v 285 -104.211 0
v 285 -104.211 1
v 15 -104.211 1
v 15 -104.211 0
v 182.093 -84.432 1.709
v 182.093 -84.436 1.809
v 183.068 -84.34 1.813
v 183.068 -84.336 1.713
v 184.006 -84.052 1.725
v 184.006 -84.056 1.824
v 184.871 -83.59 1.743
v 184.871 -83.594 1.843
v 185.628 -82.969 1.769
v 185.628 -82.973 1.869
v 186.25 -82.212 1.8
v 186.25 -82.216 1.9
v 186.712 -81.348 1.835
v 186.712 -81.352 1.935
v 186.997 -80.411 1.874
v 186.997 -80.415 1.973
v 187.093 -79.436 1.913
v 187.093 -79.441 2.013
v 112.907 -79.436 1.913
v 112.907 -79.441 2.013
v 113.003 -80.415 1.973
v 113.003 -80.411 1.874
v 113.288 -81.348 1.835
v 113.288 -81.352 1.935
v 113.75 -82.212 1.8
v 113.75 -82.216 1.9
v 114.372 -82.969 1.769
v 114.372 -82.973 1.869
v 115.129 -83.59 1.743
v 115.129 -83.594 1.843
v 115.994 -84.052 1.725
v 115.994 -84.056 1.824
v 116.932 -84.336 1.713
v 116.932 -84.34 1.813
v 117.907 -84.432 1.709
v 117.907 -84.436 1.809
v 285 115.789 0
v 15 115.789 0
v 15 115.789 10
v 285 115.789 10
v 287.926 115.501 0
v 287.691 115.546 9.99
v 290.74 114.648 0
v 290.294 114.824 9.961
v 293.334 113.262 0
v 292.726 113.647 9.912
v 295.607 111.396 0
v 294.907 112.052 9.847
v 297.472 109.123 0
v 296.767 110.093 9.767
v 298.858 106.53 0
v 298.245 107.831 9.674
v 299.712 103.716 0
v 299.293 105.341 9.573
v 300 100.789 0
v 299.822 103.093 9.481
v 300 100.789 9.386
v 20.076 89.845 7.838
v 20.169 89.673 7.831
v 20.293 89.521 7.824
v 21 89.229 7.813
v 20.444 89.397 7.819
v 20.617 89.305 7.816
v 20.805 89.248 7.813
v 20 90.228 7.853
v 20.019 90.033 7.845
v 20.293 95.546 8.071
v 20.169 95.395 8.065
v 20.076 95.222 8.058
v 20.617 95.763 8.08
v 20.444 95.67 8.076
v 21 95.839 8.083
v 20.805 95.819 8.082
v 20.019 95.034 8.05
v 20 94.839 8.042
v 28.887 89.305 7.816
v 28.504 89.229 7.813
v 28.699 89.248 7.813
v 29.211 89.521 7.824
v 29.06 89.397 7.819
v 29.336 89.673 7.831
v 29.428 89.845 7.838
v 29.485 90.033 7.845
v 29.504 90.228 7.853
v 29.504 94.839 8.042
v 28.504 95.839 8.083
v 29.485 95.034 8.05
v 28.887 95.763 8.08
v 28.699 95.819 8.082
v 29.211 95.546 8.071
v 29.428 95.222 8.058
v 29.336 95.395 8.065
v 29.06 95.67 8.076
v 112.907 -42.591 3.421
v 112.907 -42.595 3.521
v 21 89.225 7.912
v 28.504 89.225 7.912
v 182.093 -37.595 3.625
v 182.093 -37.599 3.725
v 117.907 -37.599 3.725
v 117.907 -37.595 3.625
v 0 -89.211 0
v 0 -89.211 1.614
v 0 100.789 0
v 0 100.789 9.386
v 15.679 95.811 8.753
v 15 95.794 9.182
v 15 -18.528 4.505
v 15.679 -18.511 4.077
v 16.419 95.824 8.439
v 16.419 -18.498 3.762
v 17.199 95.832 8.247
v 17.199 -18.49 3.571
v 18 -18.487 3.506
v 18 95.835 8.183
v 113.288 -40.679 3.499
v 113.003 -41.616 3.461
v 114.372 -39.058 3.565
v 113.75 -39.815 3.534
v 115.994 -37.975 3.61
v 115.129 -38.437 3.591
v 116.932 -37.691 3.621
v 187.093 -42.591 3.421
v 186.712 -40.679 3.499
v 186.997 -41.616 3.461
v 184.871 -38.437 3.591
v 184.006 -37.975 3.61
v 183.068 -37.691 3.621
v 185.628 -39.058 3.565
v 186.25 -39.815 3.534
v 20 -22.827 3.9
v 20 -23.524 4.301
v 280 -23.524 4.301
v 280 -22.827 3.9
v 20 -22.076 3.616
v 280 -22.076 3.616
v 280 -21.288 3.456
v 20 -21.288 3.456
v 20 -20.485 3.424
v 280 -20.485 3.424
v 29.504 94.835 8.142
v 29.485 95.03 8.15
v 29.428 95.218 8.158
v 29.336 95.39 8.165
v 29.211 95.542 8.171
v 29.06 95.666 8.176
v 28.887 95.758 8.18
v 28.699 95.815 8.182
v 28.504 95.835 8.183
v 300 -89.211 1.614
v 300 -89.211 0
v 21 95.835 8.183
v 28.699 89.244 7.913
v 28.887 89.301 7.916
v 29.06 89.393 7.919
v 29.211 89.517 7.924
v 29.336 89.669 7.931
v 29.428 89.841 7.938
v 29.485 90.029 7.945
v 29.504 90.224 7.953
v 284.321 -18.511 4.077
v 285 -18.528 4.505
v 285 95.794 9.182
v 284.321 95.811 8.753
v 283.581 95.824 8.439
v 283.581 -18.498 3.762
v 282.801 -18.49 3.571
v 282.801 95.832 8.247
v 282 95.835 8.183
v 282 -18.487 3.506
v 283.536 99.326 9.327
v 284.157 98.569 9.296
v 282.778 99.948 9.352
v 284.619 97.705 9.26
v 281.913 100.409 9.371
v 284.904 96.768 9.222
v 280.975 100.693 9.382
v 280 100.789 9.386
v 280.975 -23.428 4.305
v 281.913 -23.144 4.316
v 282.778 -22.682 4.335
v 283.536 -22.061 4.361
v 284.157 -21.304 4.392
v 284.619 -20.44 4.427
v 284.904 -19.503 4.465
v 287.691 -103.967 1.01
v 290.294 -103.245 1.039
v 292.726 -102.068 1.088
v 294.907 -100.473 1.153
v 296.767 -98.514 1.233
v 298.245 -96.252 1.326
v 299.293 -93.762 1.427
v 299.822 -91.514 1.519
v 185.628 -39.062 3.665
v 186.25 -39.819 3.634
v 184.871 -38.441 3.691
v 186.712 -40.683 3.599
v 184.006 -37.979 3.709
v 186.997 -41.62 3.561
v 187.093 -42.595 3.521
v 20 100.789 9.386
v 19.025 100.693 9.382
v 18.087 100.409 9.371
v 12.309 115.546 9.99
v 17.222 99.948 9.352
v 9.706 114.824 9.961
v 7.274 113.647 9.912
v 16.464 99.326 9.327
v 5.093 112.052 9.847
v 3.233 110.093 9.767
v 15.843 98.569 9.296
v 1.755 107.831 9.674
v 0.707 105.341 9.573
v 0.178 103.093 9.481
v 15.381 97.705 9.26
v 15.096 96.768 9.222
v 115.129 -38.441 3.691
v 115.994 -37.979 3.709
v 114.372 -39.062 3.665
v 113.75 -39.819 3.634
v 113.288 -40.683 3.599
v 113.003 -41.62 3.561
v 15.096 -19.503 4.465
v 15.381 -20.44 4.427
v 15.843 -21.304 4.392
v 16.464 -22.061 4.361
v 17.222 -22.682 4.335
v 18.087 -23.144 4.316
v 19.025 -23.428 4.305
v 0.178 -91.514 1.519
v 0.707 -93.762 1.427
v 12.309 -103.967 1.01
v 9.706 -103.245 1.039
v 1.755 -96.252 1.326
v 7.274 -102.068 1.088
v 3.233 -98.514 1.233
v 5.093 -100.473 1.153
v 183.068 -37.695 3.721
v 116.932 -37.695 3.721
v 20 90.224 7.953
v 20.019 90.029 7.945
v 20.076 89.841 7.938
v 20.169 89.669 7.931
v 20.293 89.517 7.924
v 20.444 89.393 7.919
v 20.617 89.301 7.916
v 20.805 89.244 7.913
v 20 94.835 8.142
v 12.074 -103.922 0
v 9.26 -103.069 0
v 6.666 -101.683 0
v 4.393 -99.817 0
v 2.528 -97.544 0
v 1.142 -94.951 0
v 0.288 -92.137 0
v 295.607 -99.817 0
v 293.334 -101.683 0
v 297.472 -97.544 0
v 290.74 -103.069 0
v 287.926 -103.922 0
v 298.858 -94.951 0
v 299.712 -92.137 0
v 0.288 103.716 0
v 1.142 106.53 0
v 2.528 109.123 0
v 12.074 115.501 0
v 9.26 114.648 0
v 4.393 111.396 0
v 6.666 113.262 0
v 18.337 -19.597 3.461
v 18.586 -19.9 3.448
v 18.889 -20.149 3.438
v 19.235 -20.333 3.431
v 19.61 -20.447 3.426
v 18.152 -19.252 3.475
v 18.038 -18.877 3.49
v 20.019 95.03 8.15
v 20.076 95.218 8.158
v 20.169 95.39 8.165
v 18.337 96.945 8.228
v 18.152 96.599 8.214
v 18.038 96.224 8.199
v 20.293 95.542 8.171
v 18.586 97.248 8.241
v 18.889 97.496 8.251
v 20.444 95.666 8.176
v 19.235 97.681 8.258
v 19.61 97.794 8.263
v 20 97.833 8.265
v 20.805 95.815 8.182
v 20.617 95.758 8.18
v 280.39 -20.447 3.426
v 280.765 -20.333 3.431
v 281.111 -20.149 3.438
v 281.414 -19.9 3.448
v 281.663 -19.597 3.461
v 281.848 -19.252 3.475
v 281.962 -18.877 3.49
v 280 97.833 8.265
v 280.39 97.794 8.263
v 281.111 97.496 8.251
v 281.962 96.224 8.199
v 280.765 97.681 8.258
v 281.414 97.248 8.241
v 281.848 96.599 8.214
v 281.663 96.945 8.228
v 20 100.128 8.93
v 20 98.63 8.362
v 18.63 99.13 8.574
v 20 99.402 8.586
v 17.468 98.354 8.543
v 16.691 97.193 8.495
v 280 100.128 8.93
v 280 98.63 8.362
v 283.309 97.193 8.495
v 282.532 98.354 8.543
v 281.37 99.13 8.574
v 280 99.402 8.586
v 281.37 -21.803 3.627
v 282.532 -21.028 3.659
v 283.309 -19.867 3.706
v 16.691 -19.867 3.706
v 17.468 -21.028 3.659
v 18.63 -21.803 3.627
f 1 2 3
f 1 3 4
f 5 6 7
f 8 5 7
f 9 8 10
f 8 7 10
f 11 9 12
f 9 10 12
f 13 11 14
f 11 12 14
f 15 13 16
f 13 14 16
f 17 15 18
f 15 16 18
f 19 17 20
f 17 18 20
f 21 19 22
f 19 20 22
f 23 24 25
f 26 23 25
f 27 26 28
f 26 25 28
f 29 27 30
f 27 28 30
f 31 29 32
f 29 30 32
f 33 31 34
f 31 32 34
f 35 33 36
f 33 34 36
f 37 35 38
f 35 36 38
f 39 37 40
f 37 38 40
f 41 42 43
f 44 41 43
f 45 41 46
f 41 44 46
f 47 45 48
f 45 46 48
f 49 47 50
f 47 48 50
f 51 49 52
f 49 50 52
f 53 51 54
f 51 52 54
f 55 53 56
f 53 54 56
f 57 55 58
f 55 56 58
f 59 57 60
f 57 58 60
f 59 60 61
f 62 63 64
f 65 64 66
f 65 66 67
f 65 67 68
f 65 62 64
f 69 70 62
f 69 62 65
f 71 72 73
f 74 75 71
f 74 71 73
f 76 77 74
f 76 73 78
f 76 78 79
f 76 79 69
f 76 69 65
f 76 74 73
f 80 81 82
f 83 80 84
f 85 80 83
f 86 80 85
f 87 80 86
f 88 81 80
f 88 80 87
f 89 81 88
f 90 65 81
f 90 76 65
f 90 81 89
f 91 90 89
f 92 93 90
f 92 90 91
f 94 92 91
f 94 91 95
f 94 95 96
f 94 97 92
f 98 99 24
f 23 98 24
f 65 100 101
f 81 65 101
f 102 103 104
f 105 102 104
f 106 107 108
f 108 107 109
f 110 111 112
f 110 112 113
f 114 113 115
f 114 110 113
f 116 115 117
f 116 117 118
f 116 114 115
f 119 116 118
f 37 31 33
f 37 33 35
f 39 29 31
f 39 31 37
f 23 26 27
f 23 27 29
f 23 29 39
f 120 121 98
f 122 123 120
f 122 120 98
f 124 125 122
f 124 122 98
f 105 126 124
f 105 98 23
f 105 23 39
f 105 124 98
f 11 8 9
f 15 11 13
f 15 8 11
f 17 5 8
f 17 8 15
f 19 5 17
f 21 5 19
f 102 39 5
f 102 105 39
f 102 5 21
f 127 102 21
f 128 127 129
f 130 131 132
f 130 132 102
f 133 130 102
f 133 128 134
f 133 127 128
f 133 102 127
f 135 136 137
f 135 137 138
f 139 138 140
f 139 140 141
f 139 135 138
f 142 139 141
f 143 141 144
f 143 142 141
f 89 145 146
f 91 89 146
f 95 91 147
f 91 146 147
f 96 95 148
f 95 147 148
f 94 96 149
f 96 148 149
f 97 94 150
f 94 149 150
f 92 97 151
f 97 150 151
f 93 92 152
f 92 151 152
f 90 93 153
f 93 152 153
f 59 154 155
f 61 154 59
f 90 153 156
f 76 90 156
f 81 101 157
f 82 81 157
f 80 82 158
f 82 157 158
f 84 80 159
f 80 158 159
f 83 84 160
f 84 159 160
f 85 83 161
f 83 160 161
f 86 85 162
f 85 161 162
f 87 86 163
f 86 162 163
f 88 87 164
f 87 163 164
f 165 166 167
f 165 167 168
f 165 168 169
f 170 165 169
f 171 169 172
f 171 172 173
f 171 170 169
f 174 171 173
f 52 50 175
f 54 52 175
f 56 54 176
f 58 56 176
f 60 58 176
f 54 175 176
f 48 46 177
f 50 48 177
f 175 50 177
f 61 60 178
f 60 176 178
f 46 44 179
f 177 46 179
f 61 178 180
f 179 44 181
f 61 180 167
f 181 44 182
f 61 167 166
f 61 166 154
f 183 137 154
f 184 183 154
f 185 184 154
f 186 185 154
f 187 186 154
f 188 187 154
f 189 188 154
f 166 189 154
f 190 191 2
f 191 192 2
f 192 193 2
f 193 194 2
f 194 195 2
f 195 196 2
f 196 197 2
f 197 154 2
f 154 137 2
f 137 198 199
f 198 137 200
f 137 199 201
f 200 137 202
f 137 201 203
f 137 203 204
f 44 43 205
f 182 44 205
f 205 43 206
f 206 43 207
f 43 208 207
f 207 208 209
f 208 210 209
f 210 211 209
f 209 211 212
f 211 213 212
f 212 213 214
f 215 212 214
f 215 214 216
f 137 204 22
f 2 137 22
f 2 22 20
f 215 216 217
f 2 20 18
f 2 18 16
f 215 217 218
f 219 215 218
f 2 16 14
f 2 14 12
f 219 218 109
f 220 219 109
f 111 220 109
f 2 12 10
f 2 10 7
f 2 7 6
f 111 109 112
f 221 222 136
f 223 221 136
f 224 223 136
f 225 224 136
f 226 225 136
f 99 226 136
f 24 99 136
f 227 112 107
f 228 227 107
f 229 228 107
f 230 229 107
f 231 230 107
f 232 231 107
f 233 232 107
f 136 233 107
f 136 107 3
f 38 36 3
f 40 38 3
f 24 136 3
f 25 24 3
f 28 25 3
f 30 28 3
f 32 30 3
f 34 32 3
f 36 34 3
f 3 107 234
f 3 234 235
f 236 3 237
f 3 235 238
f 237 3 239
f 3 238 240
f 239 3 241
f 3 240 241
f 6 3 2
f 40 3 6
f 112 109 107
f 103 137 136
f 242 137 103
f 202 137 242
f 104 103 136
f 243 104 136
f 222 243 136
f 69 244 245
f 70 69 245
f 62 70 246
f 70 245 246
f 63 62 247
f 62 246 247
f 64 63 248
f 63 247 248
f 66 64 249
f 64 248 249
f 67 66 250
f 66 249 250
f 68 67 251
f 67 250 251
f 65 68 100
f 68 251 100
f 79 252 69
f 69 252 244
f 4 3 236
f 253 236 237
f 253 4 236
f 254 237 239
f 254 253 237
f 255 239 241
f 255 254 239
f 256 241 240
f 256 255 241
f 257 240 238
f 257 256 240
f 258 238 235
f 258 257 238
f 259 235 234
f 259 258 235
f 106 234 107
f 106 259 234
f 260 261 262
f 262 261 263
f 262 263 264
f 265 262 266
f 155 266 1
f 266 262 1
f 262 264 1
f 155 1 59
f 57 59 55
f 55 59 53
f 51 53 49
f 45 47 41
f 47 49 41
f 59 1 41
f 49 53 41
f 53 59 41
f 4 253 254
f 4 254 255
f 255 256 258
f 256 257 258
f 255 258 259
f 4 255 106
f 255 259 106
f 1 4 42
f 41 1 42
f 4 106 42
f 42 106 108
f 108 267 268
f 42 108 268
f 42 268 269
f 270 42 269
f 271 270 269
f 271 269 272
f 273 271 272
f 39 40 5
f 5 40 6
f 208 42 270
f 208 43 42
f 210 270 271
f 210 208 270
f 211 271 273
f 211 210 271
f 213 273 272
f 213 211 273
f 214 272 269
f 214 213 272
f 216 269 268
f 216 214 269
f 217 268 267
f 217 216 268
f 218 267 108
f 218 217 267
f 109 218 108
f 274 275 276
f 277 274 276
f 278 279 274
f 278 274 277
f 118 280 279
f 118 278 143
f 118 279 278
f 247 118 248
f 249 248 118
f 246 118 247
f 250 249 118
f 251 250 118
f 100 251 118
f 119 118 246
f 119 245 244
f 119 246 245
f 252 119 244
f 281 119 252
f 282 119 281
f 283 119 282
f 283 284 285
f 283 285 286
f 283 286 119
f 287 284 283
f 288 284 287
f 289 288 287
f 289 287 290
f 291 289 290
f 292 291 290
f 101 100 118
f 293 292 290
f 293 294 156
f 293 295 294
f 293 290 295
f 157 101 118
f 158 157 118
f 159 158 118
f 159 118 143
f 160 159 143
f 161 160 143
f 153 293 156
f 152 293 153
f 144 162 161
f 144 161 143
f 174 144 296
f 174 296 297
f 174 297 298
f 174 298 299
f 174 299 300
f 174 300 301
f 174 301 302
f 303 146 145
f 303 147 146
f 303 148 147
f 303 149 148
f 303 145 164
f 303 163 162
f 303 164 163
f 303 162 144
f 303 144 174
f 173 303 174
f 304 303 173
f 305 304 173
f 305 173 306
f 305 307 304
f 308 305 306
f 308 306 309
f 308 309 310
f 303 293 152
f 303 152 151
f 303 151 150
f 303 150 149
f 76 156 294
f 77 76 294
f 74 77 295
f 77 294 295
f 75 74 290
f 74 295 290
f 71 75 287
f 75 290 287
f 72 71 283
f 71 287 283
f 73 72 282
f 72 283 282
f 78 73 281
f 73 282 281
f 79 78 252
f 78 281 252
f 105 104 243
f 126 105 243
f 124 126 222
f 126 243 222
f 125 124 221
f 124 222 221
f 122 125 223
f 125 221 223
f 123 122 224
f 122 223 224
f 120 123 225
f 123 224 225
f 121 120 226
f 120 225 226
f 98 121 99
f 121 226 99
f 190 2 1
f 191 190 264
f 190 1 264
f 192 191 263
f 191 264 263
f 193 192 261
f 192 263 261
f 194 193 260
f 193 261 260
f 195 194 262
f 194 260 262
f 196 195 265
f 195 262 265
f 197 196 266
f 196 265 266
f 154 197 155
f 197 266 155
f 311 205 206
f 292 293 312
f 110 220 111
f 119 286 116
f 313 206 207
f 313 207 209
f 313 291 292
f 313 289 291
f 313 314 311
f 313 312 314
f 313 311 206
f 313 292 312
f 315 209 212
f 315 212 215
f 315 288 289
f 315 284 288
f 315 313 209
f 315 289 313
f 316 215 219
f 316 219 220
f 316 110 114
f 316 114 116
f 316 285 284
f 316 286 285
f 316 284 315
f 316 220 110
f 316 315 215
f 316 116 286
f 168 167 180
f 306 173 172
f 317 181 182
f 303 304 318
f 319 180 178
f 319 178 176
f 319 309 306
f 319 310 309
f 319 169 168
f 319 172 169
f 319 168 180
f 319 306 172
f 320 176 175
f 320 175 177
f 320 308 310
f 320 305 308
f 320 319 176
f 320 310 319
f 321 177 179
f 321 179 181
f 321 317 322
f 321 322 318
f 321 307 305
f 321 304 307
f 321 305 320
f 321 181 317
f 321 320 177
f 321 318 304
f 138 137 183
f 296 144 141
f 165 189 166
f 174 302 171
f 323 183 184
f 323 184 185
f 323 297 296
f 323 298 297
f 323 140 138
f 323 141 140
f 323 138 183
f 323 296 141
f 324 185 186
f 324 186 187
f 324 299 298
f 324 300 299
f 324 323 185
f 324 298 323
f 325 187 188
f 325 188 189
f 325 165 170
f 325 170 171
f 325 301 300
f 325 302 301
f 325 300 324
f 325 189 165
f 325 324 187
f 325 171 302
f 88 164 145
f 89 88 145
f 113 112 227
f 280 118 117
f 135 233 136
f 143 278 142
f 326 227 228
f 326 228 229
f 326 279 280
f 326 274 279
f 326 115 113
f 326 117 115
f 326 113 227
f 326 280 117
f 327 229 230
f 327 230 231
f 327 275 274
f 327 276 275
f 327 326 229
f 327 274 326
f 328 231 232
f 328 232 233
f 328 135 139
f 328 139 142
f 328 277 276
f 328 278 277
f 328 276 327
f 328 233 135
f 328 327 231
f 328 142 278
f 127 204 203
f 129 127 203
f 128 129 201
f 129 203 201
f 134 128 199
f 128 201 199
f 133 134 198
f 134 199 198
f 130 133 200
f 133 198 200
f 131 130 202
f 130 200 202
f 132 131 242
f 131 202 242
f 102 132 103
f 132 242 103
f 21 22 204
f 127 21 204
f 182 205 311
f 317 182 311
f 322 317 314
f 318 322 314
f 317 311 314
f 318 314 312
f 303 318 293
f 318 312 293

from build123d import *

# Parameters (mm, degrees)
F1_DEPTH     = 300
F2_R         = 15
F4_DEPTH     = 1
F5_T1_DEPTH  = 260
F5_T3_DEPTH  = 114.4173096389
F5_T5_DEPTH  = 114.4173096389
F5_T8_ANGLE  = 90
F5_T10_ANGLE = 90
F5_T12_ANGLE = 90
F5_T14_ANGLE = 90
F7_DEPTH     = 0.1
F9_DEPTH     = 0.1


# Not quite as in the source:
# - a fillet or chamfer that OpenCascade refuses, or shapes differently, is made with other operations: its cross-section is extruded or revolved along the edge and cut away or added


with BuildPart() as f1:
    # F0 (on Right) → F1 (new body)
    with BuildSketch(Plane.YZ):
        Polygon((-104.210527479, 1), (-104.210527479, 0), (115.789472521, 0), (115.789472521, 10), align=None)
    extrude(amount=F1_DEPTH)

    # F2
    f2_edges = [f1.edges().sort_by_distance(p)[0] for p in [
        (300, 115.789473, 5),
        (0, 115.789473, 5),
        (0, -104.210527, 0.5),
        (300, -104.210527, 0.5),
    ]]
    fillet(f2_edges, radius=F2_R)

    # F3 (on face) → F4 (cut)
    with BuildSketch(Plane(origin=(0, -0.2149512742, 5.2543644811), x_dir=(1, 0, 0), z_dir=(0, -0.040874902, 0.999164272))):
        with BuildLine():
            Line((280, 101.0889066279), (20, 101.0889066279))
            ThreePointArc((20, 101.0889066279), (16.4644660941, 99.6244405339), (15, 96.0889066279))
            Line((15, 96.0889066279), (15, -18.328403011))
            ThreePointArc((15, -18.328403011), (16.4644660941, -21.8639369169), (20, -23.328403011))
            Line((20, -23.328403011), (280, -23.328403011))
            ThreePointArc((280, -23.328403011), (283.5355339059, -21.8639369169), (285, -18.328403011))
            Line((285, -18.328403011), (285, 96.0889066279))
            ThreePointArc((285, 96.0889066279), (283.5355339059, 99.6244405339), (280, 101.0889066279))
        make_face()
    extrude(amount=-F4_DEPTH, mode=Mode.SUBTRACT)

    # F5: fillet of radius 5 on 8 edges, made by hand

    # F5_s2 → F5_t1 (join)
    with BuildSketch(Plane.YZ.offset(20)):
        with BuildLine():
            ThreePointArc((100.789472521, 9.3863636364), (99.4021842094, 8.5855726288), (97.8328546072, 8.2645746583))
            Line((97.8328546072, 8.2645746583), (100.8303474231, 8.3871993644))
            Line((100.8303474231, 8.3871993644), (100.789472521, 9.3863636364))
        make_face()
        with BuildLine():
            ThreePointArc((-23.5238580849, 4.3008182934), (-22.0757956208, 3.6160189085), (-20.485490367, 3.4242787275))
            Line((-20.485490367, 3.4242787275), (-23.4829831829, 3.3016540214))
            Line((-23.4829831829, 3.3016540214), (-23.5238580849, 4.3008182934))
        make_face()
    extrude(amount=F5_T1_DEPTH)

    # F5_s4 → F5_t3 (join)
    with BuildSketch(Plane(origin=(0, 96.0086024354, 3.9276246451), x_dir=(1, 0, 0), z_dir=(0, -0.999164272, -0.040874902))):
        with BuildLine():
            ThreePointArc((15, 5.2587593737), (16.4188611699, 4.5153428835), (18, 4.2587593737))
            Line((18, 4.2587593737), (15, 4.2587593737))
            Line((15, 4.2587593737), (15, 5.2587593737))
        make_face()
    extrude(amount=F5_T3_DEPTH)

    # F5_s6 → F5_t5 (join)
    with BuildSketch(Plane(origin=(0, -18.3130854508, -0.7491716775), x_dir=(1, 0, 0), z_dir=(0, 0.999164272, 0.040874902))):
        with BuildLine():
            ThreePointArc((285, -5.2587593737), (283.5811388301, -4.5153428835), (282, -4.2587593737))
            Line((282, -4.2587593737), (285, -4.2587593737))
            Line((285, -4.2587593737), (285, -5.2587593737))
        make_face()
    extrude(amount=F5_T5_DEPTH)

    # F5_s7 → F5_t8 (revolve)
    with BuildSketch(Plane.YZ.offset(20)):
        with BuildLine():
            ThreePointArc((100.789472521, 9.3863636364), (99.4021842094, 8.5855726288), (97.8328546072, 8.2645746583))
            Line((97.8328546072, 8.2645746583), (100.8303474231, 8.3871993644))
            Line((100.8303474231, 8.3871993644), (100.789472521, 9.3863636364))
        make_face()
    revolve(axis=Axis((20, 95.8345260632, 8.1828248542), (0, -0.040874902, 0.999164272)), revolution_arc=F5_T8_ANGLE)

    # F5_s9 → F5_t10 (revolve)
    with BuildSketch(Plane(origin=(0, -18.3130854508, -0.7491716775), x_dir=(1, 0, 0), z_dir=(0, 0.999164272, 0.040874902))):
        with BuildLine():
            ThreePointArc((15, -5.2587593737), (16.4188611699, -4.5153428835), (18, -4.2587593737))
            Line((18, -4.2587593737), (15, -4.2587593737))
            Line((15, -4.2587593737), (15, -5.2587593737))
        make_face()
    revolve(axis=Axis((20, -18.487161823, 3.5060285316), (0, -0.040874902, 0.999164272)), revolution_arc=F5_T10_ANGLE)

    # F5_s11 → F5_t12 (revolve)
    with BuildSketch(Plane.YZ.offset(280)):
        with BuildLine():
            ThreePointArc((-23.5238580849, 4.3008182934), (-22.0757956208, 3.6160189085), (-20.485490367, 3.4242787275))
            Line((-20.485490367, 3.4242787275), (-23.4829831829, 3.3016540214))
            Line((-23.4829831829, 3.3016540214), (-23.5238580849, 4.3008182934))
        make_face()
    revolve(axis=Axis((280, -18.487161823, 3.5060285316), (0, -0.040874902, 0.999164272)), revolution_arc=F5_T12_ANGLE)

    # F5_s13 → F5_t14 (revolve)
    with BuildSketch(Plane(origin=(0, 96.0086024354, 3.9276246451), x_dir=(1, 0, 0), z_dir=(0, -0.999164272, -0.040874902))):
        with BuildLine():
            ThreePointArc((285, 5.2587593737), (283.5811388301, 4.5153428835), (282, 4.2587593737))
            Line((282, 4.2587593737), (285, 4.2587593737))
            Line((285, 4.2587593737), (285, 5.2587593737))
        make_face()
    revolve(axis=Axis((280, 95.8345260632, 8.1828248542), (0, -0.040874902, 0.999164272)), revolution_arc=F5_T14_ANGLE)

    # F6 (on face) → F7 (cut)
    with BuildSketch(Plane(origin=(0, -0.2149512742, 5.2543644811), x_dir=(1, 0, 0), z_dir=(0, -0.040874902, 0.999164272))):
        with BuildLine():
            Line((182.0928883553, -37.4153330922), (117.9071116447, -37.4153330922))
            ThreePointArc((117.9071116447, -37.4153330922), (114.3715777388, -38.8797991863), (112.9071116447, -42.4153330922))
            Line((112.9071116447, -42.4153330922), (112.9071116447, -79.291882813))
            ThreePointArc((112.9071116447, -79.291882813), (114.3715777388, -82.8274167189), (117.9071116447, -84.291882813))
            Line((117.9071116447, -84.291882813), (182.0928883553, -84.291882813))
            ThreePointArc((182.0928883553, -84.291882813), (185.6284222612, -82.8274167189), (187.0928883553, -79.291882813))
            Line((187.0928883553, -79.291882813), (187.0928883553, -42.4153330922))
            ThreePointArc((187.0928883553, -42.4153330922), (185.6284222612, -38.8797991863), (182.0928883553, -37.4153330922))
        make_face()
    extrude(amount=-F7_DEPTH, mode=Mode.SUBTRACT)

    # F8 (on face) → F9 (cut)
    with BuildSketch(Plane(origin=(0, -0.1740763722, 4.2552002091), x_dir=(1, 0, 0), z_dir=(0, -0.040874902, 0.999164272))):
        with BuildLine():
            Line((28.5042302459, 96.0889066279), (21, 96.0889066279))
            ThreePointArc((21, 96.0889066279), (20.2928932188, 95.7960134091), (20, 95.0889066279))
            Line((20, 95.0889066279), (20, 90.473426342))
            ThreePointArc((20, 90.473426342), (20.2928932188, 89.7663195608), (21, 89.473426342))
            Line((21, 89.473426342), (28.5042302459, 89.473426342))
            ThreePointArc((28.5042302459, 89.473426342), (29.2113370271, 89.7663195608), (29.5042302459, 90.473426342))
            Line((29.5042302459, 90.473426342), (29.5042302459, 95.0889066279))
            ThreePointArc((29.5042302459, 95.0889066279), (29.2113370271, 95.7960134091), (28.5042302459, 96.0889066279))
        make_face()
    extrude(amount=-F9_DEPTH, mode=Mode.SUBTRACT)


solid = f1.part
